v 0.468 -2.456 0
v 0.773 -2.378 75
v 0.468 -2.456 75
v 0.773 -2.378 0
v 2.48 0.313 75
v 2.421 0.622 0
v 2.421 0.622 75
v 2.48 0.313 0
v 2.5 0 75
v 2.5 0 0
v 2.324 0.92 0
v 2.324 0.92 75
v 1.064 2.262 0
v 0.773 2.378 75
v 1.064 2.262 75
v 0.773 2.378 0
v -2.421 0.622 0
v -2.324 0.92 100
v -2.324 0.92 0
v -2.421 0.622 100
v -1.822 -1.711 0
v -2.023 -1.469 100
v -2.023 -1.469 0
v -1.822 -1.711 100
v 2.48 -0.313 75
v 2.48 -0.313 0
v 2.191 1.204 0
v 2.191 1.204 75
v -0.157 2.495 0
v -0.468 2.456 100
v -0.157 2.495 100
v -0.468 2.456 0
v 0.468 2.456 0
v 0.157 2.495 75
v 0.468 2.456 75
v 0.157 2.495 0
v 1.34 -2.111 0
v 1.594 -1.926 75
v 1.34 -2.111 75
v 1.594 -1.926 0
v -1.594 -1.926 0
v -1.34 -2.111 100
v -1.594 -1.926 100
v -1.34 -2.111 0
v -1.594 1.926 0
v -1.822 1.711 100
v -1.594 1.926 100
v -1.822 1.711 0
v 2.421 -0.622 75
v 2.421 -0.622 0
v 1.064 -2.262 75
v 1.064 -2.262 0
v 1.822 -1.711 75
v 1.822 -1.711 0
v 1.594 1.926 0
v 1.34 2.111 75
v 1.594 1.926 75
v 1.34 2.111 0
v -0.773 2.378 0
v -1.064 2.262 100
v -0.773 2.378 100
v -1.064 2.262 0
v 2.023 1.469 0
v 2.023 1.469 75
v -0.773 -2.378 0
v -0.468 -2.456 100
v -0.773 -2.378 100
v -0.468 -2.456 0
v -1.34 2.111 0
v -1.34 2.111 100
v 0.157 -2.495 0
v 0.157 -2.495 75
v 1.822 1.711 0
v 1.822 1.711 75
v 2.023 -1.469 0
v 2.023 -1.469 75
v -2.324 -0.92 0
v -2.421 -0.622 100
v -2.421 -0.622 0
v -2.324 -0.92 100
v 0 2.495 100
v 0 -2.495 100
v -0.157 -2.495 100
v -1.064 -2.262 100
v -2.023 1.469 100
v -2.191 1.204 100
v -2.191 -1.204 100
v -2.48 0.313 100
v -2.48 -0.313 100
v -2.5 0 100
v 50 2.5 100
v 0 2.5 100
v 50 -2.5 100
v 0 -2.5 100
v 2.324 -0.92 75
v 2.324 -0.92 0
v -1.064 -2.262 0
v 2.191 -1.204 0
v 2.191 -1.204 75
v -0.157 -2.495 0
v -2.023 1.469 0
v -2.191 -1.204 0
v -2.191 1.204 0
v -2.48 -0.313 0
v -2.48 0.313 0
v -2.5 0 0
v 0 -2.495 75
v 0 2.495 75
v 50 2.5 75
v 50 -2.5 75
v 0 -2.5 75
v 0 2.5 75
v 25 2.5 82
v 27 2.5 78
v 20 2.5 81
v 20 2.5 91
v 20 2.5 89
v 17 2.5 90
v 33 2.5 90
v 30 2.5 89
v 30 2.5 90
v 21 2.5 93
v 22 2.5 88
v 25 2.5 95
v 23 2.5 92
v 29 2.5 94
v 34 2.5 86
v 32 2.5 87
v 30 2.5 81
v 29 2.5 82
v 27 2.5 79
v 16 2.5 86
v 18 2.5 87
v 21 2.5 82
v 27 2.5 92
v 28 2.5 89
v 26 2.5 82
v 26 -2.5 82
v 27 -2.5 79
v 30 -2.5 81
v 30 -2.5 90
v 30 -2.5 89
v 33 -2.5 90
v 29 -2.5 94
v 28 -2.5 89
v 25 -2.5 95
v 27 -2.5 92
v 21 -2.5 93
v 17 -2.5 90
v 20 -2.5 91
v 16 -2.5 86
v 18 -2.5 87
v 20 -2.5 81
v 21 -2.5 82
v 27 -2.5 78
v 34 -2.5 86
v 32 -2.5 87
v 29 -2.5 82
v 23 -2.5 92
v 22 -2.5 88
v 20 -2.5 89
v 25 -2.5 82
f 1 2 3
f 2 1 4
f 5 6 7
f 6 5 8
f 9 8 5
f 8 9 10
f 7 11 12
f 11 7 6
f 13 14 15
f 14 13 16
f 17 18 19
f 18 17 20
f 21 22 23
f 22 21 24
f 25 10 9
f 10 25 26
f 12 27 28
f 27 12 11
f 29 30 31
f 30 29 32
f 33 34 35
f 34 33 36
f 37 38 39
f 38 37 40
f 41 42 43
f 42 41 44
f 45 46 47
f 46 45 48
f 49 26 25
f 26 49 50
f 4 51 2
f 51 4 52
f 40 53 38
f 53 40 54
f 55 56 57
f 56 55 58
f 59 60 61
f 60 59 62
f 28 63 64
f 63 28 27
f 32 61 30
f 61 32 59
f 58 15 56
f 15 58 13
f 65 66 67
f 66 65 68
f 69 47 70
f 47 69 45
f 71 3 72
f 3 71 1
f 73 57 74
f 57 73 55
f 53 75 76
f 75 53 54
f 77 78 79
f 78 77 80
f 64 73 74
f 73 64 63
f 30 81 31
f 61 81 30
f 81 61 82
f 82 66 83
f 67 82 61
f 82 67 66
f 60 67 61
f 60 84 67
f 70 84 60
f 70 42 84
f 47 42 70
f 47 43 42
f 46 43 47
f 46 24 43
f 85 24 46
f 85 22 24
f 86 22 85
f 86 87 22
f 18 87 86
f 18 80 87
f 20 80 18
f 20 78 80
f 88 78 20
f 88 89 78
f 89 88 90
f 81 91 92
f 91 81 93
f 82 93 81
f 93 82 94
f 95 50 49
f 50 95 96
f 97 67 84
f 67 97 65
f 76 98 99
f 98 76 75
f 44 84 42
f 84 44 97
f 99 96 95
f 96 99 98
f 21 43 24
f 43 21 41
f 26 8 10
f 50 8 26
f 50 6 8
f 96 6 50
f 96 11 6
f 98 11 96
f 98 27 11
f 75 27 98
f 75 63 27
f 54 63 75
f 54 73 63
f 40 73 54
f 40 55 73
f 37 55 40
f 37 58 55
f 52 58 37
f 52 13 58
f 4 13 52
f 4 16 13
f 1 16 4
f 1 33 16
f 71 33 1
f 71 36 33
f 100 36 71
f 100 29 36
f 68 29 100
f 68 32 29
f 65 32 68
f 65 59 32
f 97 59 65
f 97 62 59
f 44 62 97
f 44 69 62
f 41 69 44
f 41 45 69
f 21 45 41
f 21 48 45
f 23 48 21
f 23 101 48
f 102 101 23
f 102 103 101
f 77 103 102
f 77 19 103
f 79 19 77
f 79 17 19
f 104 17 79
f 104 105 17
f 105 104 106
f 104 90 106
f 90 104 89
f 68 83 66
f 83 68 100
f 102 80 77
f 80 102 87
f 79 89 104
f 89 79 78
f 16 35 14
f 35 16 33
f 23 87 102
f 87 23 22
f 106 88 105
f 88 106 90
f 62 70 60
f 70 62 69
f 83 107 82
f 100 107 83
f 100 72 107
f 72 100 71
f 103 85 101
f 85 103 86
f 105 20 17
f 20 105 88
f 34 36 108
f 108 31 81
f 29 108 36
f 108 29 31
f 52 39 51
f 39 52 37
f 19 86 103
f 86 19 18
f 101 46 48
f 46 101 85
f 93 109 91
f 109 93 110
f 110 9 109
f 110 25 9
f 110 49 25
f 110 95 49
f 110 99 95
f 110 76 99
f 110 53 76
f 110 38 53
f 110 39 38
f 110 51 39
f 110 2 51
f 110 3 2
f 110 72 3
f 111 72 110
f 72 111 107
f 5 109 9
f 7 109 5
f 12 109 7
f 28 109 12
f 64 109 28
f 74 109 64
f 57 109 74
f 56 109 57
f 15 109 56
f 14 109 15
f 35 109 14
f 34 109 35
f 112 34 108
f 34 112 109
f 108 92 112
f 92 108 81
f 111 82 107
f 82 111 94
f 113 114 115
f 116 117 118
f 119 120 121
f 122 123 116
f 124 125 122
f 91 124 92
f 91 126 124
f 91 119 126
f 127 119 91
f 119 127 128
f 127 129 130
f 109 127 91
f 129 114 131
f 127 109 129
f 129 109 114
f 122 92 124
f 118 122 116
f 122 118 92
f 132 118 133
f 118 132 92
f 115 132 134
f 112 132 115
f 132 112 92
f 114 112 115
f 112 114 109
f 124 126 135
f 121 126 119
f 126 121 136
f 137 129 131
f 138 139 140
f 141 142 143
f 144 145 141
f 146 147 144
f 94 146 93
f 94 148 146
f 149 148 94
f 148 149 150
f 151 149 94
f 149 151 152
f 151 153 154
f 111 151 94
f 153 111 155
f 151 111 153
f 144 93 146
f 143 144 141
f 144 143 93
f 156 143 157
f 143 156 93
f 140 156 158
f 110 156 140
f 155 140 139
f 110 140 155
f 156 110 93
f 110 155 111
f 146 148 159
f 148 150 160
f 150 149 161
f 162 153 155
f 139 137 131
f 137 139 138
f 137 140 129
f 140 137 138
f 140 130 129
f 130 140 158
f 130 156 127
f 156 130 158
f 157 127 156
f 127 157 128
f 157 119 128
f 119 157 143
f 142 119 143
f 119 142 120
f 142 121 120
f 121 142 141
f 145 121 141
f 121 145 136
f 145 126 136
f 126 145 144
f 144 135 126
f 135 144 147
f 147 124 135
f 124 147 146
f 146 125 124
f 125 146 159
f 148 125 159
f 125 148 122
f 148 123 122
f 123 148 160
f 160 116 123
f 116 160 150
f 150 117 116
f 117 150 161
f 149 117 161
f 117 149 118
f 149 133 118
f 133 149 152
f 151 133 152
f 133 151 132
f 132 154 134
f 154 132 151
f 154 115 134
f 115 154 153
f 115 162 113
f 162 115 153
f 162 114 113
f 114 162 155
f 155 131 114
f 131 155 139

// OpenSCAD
/*
 * The difference function subtracts models from one another.
 * Subsequent objects are subtracted from the first model listed.
 */
difference() {
    // Combine flag pole to flag backing.
    union() {
        cylinder(d = 5, h = 100, $fn = 50); // Flag pole.

        translate([0, -2.5, 75]) // Move flag backing to the top of pole and center.
            cube([50, 5, 25]); // Flag back, to be connected to pole and maple leaf.
    }

    // Subtract maple leaf from flag pole and flag backing.
    translate([25, 3, 85]) { // Move up flag pole and to the right.
        rotate([90, 0, 0]) { // Orient maple leaf wrt. pole.
            linear_extrude(height = 6) { // Convert 2D to 3D.
                // Polygon with vertices made to look like a maple leaf.
                polygon(points = [[1, -3], [5, -4], [4, -3], [9, 1], [7, 2], [8, 5], [5, 4], [5, 5],
                        [3, 4], [4, 9], [2, 7], [0,10], [-2, 7], [-4, 8], [-3, 3], [-5, 6],
                        [-5, 4], [-8, 5], [-7, 2], [-9, 1], [-4, -3], [-5,-4], [0, -3], [2, -7],
                        [2, -6], [1, -3]]);
            }
        }
    }
}
